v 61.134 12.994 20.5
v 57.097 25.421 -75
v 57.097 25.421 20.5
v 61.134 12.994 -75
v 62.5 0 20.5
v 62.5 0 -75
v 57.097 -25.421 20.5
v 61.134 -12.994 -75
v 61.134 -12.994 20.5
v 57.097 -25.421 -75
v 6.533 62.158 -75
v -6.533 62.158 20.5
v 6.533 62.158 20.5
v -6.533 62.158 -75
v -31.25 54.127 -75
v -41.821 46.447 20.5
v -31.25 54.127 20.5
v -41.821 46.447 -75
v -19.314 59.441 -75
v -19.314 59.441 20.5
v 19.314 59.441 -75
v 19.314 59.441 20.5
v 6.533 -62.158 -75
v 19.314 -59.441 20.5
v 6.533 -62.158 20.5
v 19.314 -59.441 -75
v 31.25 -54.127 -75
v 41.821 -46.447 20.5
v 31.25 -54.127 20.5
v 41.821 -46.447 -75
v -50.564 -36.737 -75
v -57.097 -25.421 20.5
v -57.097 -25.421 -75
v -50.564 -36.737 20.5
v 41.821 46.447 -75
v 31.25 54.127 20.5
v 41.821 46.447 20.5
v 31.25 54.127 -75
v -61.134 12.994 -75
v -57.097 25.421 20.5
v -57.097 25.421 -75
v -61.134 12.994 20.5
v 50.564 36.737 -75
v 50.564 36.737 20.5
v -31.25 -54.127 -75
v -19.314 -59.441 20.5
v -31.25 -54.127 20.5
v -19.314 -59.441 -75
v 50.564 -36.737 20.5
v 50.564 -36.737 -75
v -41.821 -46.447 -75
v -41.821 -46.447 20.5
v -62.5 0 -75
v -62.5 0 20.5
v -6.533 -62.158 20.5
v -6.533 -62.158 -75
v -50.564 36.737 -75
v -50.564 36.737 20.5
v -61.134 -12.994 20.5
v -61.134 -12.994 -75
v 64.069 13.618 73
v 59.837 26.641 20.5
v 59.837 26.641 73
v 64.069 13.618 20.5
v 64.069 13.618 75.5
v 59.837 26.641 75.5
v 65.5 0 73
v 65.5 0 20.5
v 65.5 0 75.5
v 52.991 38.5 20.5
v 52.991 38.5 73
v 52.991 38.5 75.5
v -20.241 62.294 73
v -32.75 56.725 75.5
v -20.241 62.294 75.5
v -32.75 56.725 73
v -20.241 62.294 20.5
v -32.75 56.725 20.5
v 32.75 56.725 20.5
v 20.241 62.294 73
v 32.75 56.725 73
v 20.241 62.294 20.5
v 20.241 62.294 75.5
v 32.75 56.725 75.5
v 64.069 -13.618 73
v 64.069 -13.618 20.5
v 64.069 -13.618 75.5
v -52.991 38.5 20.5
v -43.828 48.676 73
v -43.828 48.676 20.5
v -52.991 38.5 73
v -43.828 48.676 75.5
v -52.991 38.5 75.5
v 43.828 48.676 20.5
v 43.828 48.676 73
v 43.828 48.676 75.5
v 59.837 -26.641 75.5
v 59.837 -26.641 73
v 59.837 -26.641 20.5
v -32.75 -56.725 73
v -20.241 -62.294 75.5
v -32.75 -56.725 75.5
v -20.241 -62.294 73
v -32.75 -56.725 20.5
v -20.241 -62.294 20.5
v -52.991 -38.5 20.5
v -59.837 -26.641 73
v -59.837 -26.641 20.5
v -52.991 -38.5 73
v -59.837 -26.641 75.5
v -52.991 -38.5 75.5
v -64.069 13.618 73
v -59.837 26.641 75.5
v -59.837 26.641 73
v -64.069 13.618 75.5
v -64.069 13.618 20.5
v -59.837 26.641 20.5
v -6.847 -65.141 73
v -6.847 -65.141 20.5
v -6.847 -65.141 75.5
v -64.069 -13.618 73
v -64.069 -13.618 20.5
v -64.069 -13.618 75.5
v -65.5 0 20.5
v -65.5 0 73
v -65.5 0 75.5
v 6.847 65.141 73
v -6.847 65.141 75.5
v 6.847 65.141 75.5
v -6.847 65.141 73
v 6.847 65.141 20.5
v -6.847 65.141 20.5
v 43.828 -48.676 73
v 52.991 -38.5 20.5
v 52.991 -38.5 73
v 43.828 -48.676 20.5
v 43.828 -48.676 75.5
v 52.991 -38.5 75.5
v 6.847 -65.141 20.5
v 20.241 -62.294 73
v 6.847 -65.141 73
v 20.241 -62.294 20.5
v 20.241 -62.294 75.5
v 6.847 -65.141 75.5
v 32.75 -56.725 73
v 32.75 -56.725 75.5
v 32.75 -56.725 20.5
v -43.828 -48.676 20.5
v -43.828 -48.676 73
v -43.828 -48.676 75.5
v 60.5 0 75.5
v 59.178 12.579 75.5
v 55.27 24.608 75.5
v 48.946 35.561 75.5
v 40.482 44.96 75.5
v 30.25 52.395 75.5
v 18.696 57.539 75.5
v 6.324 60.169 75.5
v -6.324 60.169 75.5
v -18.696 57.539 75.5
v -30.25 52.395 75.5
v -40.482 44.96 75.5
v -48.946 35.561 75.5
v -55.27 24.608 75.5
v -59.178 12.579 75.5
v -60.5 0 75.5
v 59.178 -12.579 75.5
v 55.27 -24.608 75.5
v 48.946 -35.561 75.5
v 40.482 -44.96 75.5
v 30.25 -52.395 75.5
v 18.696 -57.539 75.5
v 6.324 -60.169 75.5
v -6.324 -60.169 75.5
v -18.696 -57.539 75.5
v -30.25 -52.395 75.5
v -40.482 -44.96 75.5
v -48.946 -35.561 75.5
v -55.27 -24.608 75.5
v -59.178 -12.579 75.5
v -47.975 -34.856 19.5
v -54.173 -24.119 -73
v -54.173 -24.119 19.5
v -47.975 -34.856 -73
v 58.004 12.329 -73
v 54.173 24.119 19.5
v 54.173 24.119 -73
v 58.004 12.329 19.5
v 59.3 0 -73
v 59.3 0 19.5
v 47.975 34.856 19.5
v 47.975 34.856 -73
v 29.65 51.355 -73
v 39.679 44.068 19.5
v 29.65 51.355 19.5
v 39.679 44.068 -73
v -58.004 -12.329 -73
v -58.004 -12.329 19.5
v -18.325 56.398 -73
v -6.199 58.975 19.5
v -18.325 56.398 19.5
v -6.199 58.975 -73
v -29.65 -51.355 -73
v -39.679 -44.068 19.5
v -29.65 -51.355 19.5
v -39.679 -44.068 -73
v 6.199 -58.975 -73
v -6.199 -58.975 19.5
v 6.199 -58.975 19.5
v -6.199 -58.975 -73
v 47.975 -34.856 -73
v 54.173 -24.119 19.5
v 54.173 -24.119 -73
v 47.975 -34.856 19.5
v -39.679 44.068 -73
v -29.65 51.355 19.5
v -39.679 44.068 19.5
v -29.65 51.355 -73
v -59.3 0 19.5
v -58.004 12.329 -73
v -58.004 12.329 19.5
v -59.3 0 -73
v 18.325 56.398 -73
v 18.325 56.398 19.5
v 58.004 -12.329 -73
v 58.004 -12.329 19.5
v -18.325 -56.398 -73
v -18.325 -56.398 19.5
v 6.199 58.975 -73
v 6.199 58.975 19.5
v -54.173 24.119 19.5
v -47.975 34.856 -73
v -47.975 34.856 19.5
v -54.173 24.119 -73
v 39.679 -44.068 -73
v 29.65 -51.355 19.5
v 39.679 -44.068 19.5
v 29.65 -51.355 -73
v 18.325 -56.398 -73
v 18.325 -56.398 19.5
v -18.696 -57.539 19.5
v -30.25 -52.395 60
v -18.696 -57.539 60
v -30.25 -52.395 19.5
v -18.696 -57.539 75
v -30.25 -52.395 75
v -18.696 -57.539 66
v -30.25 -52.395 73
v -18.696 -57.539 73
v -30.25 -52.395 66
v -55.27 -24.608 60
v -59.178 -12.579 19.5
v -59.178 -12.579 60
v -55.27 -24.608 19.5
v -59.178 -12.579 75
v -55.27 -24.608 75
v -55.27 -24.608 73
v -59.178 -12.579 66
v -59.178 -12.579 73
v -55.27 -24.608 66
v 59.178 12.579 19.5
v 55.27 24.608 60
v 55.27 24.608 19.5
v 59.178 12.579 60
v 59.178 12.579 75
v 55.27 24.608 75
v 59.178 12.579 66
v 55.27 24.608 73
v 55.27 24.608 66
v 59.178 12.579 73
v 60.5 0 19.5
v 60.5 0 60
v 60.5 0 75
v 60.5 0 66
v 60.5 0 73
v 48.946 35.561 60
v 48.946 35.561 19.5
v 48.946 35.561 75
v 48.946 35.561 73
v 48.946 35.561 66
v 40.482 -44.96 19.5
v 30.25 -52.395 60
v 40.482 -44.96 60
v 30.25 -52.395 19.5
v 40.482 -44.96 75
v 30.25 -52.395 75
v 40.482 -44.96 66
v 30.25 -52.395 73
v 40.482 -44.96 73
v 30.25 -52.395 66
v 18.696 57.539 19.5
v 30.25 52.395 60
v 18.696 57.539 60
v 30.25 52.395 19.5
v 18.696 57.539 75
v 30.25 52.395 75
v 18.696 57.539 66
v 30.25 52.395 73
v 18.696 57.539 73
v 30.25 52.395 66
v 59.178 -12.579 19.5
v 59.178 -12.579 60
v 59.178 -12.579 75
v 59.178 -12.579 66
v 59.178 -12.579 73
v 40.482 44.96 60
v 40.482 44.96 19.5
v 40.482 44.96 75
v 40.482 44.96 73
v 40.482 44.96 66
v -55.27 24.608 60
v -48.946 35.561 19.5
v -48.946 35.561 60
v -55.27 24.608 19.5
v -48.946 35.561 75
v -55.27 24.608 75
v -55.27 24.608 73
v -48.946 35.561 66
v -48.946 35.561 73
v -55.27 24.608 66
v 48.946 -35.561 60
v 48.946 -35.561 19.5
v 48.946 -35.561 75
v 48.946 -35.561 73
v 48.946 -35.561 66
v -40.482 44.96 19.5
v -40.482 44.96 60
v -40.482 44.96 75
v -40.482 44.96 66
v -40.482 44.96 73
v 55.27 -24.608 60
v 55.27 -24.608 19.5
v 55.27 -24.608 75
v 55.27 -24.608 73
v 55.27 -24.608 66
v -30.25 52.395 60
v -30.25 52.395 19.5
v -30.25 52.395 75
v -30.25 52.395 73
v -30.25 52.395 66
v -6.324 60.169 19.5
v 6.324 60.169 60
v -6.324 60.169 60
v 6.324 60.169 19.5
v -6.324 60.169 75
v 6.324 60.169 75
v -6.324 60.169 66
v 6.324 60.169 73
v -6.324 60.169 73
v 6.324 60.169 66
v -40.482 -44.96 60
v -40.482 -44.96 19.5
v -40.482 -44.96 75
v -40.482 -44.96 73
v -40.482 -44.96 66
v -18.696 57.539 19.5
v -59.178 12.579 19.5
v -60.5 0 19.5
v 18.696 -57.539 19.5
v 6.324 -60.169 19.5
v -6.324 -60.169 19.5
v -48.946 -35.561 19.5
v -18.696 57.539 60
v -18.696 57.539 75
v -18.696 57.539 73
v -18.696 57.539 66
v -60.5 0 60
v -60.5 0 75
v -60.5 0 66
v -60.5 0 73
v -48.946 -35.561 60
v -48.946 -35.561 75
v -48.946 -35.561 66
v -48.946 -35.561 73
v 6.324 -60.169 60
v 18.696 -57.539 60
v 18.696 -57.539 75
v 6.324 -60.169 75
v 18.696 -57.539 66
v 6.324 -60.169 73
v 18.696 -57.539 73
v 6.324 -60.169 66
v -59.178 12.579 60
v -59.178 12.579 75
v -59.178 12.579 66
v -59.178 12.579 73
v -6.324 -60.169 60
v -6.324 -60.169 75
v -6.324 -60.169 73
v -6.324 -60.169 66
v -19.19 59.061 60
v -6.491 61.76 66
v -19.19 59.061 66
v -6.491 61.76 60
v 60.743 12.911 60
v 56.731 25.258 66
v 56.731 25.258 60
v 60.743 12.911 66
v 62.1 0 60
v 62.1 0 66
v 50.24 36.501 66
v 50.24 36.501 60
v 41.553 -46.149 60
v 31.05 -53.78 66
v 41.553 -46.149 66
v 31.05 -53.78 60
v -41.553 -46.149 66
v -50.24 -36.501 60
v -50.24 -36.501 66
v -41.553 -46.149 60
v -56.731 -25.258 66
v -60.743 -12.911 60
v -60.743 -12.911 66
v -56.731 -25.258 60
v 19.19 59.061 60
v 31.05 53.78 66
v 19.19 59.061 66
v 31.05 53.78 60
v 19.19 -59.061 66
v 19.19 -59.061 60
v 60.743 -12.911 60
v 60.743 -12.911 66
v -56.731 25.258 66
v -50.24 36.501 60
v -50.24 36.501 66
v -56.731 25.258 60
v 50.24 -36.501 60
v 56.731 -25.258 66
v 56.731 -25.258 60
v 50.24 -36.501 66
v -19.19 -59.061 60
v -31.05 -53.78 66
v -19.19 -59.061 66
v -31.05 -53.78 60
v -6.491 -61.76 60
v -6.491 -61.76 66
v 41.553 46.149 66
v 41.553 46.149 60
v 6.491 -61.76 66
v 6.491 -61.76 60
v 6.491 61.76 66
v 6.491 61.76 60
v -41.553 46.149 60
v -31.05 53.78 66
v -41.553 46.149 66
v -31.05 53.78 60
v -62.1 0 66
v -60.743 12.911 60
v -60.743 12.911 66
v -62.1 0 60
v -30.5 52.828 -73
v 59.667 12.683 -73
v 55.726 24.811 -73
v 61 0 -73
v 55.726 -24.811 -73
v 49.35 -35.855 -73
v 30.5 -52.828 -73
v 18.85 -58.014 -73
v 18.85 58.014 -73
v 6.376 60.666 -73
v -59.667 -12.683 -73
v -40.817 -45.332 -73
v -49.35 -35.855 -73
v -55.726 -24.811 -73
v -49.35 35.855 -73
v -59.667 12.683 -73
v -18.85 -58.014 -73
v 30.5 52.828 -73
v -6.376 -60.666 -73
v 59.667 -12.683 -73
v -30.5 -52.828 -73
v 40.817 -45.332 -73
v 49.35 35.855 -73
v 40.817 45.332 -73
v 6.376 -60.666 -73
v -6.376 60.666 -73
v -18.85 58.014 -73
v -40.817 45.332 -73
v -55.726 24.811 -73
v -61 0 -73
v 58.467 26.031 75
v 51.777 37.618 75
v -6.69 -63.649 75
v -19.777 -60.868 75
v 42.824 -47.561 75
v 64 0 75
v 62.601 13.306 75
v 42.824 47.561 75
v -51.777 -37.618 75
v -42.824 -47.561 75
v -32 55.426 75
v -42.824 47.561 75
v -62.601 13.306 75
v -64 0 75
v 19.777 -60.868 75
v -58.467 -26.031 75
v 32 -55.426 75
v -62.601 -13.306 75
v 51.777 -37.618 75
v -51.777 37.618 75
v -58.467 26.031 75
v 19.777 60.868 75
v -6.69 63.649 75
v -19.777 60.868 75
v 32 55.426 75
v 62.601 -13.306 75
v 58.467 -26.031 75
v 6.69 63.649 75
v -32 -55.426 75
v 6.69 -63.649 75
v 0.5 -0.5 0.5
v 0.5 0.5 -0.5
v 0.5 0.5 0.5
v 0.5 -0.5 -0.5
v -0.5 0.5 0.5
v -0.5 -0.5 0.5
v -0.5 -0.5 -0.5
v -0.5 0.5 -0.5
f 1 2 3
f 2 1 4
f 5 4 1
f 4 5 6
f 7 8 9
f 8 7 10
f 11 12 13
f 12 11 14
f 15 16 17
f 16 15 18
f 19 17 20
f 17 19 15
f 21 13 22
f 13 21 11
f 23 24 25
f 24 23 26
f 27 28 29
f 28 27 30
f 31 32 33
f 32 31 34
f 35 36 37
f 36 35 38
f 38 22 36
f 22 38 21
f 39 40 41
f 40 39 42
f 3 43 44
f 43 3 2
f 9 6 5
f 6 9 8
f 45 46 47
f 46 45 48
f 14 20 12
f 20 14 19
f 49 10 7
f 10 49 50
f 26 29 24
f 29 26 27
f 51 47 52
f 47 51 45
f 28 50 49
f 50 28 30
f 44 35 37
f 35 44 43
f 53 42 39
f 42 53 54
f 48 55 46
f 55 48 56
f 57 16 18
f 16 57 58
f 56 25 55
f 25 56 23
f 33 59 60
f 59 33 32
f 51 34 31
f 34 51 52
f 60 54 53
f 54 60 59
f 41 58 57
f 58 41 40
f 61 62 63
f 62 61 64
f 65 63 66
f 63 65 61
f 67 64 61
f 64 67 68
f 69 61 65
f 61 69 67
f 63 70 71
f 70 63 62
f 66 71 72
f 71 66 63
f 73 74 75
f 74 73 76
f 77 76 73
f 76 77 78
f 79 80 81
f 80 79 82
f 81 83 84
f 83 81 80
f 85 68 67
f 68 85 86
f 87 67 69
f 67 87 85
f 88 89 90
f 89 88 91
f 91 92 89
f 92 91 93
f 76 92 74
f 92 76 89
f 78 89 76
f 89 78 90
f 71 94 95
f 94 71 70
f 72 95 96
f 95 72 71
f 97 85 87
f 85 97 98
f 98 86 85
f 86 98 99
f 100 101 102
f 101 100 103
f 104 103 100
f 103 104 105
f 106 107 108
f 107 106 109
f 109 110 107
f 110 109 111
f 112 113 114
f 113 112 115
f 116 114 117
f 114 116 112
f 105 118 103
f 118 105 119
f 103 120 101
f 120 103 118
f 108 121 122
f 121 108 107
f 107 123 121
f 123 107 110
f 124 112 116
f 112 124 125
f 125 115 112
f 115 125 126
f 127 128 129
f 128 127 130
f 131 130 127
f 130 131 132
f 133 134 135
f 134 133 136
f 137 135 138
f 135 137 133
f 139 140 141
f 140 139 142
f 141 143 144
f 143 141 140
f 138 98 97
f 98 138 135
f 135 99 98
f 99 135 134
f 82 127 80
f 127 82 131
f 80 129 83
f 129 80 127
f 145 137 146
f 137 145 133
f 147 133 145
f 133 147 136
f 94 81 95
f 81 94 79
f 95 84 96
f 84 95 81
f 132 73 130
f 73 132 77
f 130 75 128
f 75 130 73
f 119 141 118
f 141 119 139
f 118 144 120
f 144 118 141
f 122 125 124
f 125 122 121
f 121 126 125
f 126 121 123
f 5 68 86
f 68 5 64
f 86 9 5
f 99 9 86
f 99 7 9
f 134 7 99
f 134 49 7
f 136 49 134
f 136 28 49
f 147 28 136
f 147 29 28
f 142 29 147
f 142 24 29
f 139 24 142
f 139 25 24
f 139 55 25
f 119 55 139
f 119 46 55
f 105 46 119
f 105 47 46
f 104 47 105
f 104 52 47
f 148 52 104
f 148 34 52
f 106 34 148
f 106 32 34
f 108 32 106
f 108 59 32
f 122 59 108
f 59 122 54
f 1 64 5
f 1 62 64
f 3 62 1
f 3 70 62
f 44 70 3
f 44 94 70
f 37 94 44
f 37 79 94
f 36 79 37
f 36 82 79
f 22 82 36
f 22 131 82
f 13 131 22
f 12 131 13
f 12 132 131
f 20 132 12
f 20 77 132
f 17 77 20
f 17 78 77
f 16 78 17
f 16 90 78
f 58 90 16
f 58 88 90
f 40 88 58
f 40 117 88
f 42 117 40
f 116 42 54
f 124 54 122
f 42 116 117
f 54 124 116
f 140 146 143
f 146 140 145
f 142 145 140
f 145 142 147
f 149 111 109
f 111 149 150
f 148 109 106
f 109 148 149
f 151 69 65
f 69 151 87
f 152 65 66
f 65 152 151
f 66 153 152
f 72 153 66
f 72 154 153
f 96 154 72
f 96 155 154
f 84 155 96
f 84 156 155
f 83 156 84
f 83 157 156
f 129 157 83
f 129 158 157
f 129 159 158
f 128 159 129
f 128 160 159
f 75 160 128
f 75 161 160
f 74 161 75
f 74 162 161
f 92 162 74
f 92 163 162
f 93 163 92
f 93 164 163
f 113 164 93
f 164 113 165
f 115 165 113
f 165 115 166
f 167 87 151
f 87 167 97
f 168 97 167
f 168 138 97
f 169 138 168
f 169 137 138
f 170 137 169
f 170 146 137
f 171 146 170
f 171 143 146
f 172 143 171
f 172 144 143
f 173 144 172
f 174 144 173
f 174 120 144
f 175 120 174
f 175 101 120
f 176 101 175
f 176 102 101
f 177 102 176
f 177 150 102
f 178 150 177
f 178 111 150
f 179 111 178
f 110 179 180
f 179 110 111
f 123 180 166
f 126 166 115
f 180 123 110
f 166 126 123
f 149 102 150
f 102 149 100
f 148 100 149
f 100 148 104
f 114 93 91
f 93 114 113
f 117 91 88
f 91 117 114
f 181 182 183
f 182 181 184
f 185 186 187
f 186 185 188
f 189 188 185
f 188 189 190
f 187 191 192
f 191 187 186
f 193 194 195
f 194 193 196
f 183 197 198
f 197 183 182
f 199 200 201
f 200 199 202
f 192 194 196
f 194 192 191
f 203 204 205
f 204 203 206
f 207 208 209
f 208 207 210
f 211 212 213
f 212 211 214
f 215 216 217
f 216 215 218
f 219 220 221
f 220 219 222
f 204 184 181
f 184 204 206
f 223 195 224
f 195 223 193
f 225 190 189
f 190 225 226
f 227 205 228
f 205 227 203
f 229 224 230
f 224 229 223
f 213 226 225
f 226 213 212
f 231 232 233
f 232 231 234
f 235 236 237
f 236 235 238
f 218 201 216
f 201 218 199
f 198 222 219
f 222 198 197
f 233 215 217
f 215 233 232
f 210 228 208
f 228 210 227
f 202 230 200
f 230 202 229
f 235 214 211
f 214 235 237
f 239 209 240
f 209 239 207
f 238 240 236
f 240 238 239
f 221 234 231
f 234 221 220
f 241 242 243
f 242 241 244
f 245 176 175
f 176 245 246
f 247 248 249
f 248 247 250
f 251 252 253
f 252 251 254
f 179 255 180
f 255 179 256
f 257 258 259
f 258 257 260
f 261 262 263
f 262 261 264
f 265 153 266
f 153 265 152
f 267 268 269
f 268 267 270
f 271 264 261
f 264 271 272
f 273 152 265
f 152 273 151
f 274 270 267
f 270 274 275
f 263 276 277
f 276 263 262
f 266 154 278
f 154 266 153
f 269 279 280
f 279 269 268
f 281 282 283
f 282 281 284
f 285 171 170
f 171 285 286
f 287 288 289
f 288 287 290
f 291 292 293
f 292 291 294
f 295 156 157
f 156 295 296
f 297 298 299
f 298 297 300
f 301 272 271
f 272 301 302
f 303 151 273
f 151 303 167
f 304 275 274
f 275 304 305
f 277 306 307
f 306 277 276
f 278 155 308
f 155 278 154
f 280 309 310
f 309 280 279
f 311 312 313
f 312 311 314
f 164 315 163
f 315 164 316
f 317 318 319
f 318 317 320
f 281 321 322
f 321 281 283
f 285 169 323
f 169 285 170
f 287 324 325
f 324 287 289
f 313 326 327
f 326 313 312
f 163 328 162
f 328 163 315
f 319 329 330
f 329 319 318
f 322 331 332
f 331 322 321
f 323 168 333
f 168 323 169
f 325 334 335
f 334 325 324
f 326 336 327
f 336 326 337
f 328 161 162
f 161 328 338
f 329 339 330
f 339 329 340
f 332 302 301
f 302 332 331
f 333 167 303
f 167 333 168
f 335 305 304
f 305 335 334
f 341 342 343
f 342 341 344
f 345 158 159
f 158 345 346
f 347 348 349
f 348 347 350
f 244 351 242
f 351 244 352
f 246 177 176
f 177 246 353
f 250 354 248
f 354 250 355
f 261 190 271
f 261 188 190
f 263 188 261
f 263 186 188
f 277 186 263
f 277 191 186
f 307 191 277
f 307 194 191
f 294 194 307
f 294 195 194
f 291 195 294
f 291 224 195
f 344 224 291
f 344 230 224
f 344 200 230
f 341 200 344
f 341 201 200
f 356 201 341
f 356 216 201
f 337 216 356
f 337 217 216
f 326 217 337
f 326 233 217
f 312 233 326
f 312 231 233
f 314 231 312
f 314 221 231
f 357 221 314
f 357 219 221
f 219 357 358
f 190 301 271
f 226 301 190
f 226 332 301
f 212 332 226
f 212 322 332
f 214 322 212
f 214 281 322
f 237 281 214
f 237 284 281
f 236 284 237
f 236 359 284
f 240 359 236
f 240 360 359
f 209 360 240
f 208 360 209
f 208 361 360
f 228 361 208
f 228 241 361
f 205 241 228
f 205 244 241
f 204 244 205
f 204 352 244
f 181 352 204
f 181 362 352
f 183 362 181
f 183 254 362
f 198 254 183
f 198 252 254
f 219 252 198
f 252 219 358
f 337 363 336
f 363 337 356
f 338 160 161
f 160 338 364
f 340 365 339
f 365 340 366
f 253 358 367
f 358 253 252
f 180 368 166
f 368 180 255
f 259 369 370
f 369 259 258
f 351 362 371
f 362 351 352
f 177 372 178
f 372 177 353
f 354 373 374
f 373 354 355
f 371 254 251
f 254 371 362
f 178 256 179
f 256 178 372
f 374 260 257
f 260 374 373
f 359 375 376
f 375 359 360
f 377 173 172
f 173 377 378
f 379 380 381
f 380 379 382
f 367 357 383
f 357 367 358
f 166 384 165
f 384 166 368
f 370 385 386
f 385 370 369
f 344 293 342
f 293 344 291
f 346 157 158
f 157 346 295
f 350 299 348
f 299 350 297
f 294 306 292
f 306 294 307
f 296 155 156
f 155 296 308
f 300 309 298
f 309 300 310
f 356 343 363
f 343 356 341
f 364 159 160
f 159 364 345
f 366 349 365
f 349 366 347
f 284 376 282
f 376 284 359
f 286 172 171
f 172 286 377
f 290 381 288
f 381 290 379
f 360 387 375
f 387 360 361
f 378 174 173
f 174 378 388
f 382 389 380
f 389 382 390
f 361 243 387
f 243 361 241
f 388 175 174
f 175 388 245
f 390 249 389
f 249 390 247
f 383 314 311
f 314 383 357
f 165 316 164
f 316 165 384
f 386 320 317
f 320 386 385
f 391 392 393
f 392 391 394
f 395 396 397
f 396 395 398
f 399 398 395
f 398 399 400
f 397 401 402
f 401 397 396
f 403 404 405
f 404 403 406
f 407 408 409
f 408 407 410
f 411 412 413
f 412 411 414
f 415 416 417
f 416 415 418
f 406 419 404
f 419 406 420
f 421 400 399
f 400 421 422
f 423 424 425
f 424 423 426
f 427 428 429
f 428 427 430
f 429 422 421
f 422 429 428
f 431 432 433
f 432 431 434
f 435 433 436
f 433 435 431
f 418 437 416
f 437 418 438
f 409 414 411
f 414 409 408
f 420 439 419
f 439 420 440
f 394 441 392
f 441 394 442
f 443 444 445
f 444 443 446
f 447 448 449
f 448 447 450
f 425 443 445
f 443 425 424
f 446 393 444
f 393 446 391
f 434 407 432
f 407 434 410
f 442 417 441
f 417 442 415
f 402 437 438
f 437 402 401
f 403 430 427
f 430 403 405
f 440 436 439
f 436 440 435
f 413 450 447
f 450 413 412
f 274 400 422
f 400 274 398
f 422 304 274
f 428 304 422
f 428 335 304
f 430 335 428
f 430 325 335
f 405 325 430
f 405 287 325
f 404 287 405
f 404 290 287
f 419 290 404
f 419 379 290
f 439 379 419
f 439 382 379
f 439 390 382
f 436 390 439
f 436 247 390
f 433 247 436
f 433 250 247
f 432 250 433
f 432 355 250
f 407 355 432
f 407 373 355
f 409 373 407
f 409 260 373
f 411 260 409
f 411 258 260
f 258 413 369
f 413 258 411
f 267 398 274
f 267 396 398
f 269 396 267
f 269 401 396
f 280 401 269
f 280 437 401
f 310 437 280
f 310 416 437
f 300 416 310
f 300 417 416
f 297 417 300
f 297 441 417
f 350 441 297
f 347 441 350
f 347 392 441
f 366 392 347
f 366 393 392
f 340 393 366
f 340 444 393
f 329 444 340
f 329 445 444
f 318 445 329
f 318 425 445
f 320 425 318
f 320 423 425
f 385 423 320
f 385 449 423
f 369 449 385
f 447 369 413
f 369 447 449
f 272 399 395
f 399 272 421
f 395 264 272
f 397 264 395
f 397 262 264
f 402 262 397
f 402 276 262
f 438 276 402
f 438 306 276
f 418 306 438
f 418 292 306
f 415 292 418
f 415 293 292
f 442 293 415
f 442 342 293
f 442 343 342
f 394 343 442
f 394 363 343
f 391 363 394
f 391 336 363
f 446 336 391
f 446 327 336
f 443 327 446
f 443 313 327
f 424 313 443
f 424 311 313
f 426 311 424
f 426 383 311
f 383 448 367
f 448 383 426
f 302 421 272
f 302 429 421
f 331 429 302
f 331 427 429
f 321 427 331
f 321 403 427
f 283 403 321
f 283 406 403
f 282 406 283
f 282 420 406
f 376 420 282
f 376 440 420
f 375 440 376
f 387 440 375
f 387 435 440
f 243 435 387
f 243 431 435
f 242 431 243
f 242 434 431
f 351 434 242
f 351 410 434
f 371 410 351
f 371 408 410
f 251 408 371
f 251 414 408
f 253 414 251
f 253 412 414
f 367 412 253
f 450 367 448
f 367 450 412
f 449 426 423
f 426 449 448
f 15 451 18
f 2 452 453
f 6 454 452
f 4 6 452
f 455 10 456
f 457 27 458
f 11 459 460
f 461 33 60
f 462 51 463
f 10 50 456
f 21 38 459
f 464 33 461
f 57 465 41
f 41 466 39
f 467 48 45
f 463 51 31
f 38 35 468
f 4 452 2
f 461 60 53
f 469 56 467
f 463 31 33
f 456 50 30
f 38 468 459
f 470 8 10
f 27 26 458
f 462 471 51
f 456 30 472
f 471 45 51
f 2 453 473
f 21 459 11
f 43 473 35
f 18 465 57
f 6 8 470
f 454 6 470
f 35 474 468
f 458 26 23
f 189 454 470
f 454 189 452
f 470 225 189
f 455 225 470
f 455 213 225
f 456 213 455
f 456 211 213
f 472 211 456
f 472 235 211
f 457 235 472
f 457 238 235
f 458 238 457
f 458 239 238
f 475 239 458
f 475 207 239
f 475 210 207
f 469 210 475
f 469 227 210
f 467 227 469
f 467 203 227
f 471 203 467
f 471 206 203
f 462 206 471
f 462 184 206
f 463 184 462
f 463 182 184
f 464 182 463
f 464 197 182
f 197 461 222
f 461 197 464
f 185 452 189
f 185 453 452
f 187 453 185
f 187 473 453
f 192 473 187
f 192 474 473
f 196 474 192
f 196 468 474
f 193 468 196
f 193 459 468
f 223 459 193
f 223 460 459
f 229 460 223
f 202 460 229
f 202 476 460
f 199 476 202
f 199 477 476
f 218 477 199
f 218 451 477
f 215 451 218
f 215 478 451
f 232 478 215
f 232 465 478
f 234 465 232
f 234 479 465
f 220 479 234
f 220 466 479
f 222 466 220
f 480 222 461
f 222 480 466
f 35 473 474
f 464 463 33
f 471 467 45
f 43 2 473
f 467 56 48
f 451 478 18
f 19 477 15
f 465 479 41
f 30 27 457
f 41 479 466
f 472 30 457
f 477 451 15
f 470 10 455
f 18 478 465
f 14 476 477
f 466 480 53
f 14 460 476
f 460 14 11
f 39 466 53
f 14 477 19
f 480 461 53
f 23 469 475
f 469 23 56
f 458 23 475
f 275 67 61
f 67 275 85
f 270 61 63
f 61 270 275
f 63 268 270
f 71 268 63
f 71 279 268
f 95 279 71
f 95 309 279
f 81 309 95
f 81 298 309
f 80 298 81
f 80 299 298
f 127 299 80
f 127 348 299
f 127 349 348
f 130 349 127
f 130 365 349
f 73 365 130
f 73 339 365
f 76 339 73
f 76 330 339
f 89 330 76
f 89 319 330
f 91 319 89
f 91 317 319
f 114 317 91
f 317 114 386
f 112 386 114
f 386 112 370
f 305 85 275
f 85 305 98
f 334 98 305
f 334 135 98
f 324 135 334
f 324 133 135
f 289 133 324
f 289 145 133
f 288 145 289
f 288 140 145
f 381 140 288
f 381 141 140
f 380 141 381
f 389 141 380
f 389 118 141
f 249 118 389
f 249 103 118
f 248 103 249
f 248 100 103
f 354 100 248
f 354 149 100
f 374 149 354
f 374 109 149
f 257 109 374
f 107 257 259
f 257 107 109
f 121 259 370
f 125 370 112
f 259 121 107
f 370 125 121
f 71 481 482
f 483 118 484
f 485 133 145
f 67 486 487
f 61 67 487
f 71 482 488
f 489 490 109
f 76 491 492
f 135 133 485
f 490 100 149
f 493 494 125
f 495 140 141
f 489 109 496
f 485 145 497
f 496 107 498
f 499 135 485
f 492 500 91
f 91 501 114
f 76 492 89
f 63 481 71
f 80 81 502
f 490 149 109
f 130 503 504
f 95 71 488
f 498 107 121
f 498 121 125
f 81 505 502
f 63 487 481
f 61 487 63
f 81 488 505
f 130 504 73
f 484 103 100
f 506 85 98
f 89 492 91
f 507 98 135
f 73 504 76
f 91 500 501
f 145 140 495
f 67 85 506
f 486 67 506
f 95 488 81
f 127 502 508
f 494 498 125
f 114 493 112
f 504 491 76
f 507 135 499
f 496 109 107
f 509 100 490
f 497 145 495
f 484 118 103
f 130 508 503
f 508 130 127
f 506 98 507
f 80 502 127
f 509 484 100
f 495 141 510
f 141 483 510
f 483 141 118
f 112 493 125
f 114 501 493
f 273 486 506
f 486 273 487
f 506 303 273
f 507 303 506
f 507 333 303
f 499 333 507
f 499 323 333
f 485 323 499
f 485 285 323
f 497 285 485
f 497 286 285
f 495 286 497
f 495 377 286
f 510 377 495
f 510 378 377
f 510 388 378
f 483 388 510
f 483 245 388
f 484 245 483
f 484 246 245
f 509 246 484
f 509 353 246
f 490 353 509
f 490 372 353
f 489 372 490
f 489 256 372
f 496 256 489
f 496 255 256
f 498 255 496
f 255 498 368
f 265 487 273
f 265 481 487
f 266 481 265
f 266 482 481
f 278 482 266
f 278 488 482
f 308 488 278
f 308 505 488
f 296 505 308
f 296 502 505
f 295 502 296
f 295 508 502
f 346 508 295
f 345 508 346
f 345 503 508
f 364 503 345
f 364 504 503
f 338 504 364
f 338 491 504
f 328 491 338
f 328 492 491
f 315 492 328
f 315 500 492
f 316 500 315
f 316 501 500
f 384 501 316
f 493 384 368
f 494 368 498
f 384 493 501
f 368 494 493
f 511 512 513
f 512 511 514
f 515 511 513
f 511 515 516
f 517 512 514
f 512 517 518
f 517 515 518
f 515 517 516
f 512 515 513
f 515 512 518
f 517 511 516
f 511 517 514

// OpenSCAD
// Parameters
pipe_length = 150; //[75:300:1]
outer_diameter = 125; //[80:250:1]
wall_thickness = 3.2; //[1.6:6.4:0.1]
socket_length = 55; //[30:110:1]
socket_wall_extra = 1.8; //[0.8:4:0.1]
socket_outer_extra_diameter = 6; //[2:14:0.5]
seal_groove_width = 6; //[3:12:0.5]
seal_groove_depth = 1.6; //[0.8:3.2:0.1]
seal_groove_offset_from_end = 12; //[6:30:1]
chamfer_length = 2; //[1:6:0.5]
chamfer_radial = 1.5; //[0.5:4:0.1]
overlap = 1; //[0.5:2:0.1]

// Base Shapes
module pipe_body() {
  cylinder(h=pipe_length, r=outer_diameter/2, center=true);
}

module inner_bore() {
  cylinder(h=pipe_length + 2*overlap, r=outer_diameter/2 - wall_thickness, center=true);
}

module socket_end() {
  cylinder(h=socket_length, r=outer_diameter/2 + socket_outer_extra_diameter/2, center=true);
}

module socket_bore() {
  cylinder(h=socket_length + 2*overlap, r=outer_diameter/2 - wall_thickness + socket_outer_extra_diameter/2 - socket_wall_extra, center=true);
}

module seal_groove() {
  cylinder(h=seal_groove_width, r=outer_diameter/2 - wall_thickness + socket_outer_extra_diameter/2 - socket_wall_extra + seal_groove_depth, center=true);
}

module end_chamfer_spigot_outer() {
  cylinder(h=chamfer_length, r1=outer_diameter/2, r2=outer_diameter/2 - chamfer_radial, center=true);
}

module end_chamfer_spigot_inner() {
  cylinder(h=chamfer_length, r1=outer_diameter/2 - wall_thickness, r2=outer_diameter/2 - wall_thickness - chamfer_radial, center=true);
}

module end_chamfer_socket_outer() {
  cylinder(h=chamfer_length, r1=outer_diameter/2 + socket_outer_extra_diameter/2, r2=outer_diameter/2 + socket_outer_extra_diameter/2 - chamfer_radial, center=true);
}

module end_chamfer_socket_inner() {
  cylinder(h=chamfer_length, r1=outer_diameter/2 - wall_thickness + socket_outer_extra_diameter/2 - socket_wall_extra, r2=outer_diameter/2 - wall_thickness + socket_outer_extra_diameter/2 - socket_wall_extra - chamfer_radial, center=true);
}

module markings_text() {
  cube([overlap, overlap, overlap], center=true);
}

// Operations
module op_union_outer() {
  union() {
    pipe_body();
    translate([0, 0, pipe_length/2 - socket_length/2 + overlap/2]) socket_end();
  }
}

module op_difference_bores() {
  difference() {
    op_union_outer();
    inner_bore();
    translate([0, 0, pipe_length/2 - socket_length/2 + overlap/2]) socket_bore();
  }
}

module op_difference_seal_groove() {
  difference() {
    op_difference_bores();
    translate([0, 0, pipe_length/2 - seal_groove_offset_from_end]) seal_groove();
  }
}

module op_difference_end_chamfers() {
  difference() {
    op_difference_seal_groove();
    translate([0, 0, -pipe_length/2 + chamfer_length/2]) end_chamfer_spigot_outer();
    translate([0, 0, -pipe_length/2 + chamfer_length/2]) end_chamfer_spigot_inner();
    translate([0, 0, pipe_length/2 - chamfer_length/2]) end_chamfer_socket_outer();
    translate([0, 0, pipe_length/2 - chamfer_length/2]) end_chamfer_socket_inner();
  }
}

module op_union_final() {
  union() {
    op_difference_end_chamfers();
    markings_text();
  }
}

// Final Output
op_union_final();
